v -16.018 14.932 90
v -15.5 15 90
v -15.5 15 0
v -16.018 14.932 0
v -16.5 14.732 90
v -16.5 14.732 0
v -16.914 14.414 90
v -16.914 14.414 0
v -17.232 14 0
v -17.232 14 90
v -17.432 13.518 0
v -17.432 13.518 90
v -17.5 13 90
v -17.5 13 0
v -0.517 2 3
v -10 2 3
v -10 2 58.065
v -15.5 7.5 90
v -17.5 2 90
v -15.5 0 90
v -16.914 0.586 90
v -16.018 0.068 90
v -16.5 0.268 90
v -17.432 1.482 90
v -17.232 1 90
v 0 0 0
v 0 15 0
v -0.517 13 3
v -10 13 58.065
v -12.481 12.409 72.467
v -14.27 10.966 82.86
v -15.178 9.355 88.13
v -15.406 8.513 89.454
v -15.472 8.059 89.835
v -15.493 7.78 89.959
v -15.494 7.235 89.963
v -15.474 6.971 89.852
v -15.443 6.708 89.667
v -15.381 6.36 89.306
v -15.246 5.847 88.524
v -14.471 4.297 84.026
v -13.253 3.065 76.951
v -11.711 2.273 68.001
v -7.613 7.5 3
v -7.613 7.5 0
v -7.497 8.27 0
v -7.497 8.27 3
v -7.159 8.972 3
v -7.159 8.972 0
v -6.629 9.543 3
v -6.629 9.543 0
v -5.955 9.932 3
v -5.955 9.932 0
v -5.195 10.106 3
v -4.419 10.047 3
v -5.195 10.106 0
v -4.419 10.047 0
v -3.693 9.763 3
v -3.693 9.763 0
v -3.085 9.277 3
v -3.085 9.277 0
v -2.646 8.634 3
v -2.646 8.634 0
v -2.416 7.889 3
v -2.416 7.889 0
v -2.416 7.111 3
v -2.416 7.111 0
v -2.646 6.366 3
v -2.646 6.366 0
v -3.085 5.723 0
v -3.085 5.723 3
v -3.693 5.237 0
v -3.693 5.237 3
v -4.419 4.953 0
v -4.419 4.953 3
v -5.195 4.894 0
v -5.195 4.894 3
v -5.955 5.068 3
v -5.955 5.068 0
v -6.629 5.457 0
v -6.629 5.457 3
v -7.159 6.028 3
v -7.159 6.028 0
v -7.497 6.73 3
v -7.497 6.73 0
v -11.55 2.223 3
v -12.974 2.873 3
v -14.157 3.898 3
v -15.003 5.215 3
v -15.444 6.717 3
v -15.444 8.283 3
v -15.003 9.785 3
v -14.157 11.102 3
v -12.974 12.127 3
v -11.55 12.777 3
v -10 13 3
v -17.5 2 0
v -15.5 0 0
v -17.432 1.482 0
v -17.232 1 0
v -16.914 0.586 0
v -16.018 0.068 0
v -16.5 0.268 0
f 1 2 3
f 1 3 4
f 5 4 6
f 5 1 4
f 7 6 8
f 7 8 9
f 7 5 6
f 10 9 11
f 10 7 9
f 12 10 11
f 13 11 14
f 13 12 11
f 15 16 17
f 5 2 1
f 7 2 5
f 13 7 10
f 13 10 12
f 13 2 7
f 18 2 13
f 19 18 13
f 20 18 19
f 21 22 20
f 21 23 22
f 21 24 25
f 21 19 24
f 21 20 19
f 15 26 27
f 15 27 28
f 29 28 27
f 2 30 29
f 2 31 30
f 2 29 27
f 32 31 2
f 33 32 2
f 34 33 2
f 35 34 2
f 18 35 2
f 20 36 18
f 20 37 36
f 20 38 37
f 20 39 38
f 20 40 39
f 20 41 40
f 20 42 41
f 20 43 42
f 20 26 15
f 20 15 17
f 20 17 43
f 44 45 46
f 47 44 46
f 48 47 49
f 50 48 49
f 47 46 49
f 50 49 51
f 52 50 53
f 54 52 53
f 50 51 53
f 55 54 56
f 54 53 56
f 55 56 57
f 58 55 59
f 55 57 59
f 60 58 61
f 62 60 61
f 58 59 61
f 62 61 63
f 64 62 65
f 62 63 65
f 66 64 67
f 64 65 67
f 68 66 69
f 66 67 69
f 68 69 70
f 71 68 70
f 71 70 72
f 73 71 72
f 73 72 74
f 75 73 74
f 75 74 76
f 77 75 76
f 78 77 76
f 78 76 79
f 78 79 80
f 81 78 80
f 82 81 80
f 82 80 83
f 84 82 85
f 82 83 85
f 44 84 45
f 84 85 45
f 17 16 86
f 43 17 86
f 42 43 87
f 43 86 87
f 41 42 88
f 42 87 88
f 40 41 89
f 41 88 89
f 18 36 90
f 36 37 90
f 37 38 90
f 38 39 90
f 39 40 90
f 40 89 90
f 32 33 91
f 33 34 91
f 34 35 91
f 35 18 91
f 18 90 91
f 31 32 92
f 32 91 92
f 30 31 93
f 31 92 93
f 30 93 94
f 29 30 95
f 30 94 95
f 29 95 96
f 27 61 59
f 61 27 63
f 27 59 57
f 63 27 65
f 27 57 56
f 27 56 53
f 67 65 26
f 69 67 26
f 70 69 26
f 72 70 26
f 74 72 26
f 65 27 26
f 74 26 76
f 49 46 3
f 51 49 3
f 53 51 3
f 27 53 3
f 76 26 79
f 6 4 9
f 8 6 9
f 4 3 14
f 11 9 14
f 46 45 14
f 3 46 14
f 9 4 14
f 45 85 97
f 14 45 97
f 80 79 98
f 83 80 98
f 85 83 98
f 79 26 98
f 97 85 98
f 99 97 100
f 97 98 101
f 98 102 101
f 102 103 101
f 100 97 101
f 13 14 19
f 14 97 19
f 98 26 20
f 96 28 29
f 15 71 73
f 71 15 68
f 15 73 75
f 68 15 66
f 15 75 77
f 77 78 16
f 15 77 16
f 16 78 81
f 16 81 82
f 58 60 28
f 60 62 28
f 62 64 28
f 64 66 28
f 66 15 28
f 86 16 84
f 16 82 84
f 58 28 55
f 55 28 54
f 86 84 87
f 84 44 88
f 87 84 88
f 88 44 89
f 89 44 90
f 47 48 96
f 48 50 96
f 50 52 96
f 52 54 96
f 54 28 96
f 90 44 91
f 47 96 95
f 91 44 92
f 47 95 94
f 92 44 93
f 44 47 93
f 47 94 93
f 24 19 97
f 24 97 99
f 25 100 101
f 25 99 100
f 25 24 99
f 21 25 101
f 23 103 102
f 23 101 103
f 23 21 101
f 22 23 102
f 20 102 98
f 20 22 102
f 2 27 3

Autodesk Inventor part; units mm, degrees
ref_plane "YZ Plane" through (0, 0, 0) normal (1, 0, 0) x (0, 1, 0)
ref_plane "XZ Plane" through (0, 0, 0) normal (0, 1, 0) x (-1, 0, 0)
sketch "Sketch1" plane through (0, 0, 0) normal (0, 1, 0) x (-1, 0, 0)
  line L0 (0, 0) -> (17.5, 0)
  line L1 (17.5, 0) -> (17.5, 90)
  line L2 (15.5, 90) -> (17.5, 90)
  line L3 (0, 0) -> (15.5, 90)
  dimension "d0" = 90
  dimension "d1" = 17.5
  dimension "d2" = 2
extrude "Extrusion1" add sketch "Sketch1" along normal blind 15
ref_plane "Work Plane1" through (0, 0, 3) normal (0, 0, -1) x (-1, 0, 0)
sketch "Sketch2" plane through (0, 0, 3) normal (0, 0, -1) x (-1, 0, 0)
  line L0 (0, 13) -> (10, 13)
  arc A0 (10, 2) -> (10, 13) centre (10, 7.5) ccw
  line L1 (10, 2) -> (0, 2)
  line L2 (0, 15) -> (0, 13)
  line L3 (0, 2) -> (0, 0)
  line L4 (0, 15) -> (17.5, 15)
  line L5 (0, 0) -> (17.5, 0) projected
  line L6 (17.5, 15) -> (17.5, 0)
  line L7 (17.5, 0) -> (0, 0)
  line L8 (15.5, 7.5) -> (17.5, 7.5) construction
  line L9 (17.5, 0) -> (17.5, 15) construction
  line L10 (0, 2) -> (0, 13)
  line L11 (0, 0) -> (0, 15) projected
  dimension "d5" = 2
extrude "Extrusion2" cut sketch "Sketch2" against normal up to surface (87 mm away) contours L0 A0 L1 L10
sketch "Sketch3" plane through (0, 0, 0) normal (0, 0, -1) x (-1, 0, 0)
  circle A0 centre (5, 7.5) radius 2.613
  line L0 (5, 7.5) -> (0, 7.5) construction
  line L1 (0, 0) -> (0, 15) projected
  dimension "d9" = 5.226
  dimension "d10" = 5
extrude "Extrusion3" cut sketch "Sketch3" against normal blind 10
fillet "Fillet1" radius 2 2 edges at (-17.5, 0, 45) (-17.5, 15, 45)
properties part number "Cable_Chain_Holder"
